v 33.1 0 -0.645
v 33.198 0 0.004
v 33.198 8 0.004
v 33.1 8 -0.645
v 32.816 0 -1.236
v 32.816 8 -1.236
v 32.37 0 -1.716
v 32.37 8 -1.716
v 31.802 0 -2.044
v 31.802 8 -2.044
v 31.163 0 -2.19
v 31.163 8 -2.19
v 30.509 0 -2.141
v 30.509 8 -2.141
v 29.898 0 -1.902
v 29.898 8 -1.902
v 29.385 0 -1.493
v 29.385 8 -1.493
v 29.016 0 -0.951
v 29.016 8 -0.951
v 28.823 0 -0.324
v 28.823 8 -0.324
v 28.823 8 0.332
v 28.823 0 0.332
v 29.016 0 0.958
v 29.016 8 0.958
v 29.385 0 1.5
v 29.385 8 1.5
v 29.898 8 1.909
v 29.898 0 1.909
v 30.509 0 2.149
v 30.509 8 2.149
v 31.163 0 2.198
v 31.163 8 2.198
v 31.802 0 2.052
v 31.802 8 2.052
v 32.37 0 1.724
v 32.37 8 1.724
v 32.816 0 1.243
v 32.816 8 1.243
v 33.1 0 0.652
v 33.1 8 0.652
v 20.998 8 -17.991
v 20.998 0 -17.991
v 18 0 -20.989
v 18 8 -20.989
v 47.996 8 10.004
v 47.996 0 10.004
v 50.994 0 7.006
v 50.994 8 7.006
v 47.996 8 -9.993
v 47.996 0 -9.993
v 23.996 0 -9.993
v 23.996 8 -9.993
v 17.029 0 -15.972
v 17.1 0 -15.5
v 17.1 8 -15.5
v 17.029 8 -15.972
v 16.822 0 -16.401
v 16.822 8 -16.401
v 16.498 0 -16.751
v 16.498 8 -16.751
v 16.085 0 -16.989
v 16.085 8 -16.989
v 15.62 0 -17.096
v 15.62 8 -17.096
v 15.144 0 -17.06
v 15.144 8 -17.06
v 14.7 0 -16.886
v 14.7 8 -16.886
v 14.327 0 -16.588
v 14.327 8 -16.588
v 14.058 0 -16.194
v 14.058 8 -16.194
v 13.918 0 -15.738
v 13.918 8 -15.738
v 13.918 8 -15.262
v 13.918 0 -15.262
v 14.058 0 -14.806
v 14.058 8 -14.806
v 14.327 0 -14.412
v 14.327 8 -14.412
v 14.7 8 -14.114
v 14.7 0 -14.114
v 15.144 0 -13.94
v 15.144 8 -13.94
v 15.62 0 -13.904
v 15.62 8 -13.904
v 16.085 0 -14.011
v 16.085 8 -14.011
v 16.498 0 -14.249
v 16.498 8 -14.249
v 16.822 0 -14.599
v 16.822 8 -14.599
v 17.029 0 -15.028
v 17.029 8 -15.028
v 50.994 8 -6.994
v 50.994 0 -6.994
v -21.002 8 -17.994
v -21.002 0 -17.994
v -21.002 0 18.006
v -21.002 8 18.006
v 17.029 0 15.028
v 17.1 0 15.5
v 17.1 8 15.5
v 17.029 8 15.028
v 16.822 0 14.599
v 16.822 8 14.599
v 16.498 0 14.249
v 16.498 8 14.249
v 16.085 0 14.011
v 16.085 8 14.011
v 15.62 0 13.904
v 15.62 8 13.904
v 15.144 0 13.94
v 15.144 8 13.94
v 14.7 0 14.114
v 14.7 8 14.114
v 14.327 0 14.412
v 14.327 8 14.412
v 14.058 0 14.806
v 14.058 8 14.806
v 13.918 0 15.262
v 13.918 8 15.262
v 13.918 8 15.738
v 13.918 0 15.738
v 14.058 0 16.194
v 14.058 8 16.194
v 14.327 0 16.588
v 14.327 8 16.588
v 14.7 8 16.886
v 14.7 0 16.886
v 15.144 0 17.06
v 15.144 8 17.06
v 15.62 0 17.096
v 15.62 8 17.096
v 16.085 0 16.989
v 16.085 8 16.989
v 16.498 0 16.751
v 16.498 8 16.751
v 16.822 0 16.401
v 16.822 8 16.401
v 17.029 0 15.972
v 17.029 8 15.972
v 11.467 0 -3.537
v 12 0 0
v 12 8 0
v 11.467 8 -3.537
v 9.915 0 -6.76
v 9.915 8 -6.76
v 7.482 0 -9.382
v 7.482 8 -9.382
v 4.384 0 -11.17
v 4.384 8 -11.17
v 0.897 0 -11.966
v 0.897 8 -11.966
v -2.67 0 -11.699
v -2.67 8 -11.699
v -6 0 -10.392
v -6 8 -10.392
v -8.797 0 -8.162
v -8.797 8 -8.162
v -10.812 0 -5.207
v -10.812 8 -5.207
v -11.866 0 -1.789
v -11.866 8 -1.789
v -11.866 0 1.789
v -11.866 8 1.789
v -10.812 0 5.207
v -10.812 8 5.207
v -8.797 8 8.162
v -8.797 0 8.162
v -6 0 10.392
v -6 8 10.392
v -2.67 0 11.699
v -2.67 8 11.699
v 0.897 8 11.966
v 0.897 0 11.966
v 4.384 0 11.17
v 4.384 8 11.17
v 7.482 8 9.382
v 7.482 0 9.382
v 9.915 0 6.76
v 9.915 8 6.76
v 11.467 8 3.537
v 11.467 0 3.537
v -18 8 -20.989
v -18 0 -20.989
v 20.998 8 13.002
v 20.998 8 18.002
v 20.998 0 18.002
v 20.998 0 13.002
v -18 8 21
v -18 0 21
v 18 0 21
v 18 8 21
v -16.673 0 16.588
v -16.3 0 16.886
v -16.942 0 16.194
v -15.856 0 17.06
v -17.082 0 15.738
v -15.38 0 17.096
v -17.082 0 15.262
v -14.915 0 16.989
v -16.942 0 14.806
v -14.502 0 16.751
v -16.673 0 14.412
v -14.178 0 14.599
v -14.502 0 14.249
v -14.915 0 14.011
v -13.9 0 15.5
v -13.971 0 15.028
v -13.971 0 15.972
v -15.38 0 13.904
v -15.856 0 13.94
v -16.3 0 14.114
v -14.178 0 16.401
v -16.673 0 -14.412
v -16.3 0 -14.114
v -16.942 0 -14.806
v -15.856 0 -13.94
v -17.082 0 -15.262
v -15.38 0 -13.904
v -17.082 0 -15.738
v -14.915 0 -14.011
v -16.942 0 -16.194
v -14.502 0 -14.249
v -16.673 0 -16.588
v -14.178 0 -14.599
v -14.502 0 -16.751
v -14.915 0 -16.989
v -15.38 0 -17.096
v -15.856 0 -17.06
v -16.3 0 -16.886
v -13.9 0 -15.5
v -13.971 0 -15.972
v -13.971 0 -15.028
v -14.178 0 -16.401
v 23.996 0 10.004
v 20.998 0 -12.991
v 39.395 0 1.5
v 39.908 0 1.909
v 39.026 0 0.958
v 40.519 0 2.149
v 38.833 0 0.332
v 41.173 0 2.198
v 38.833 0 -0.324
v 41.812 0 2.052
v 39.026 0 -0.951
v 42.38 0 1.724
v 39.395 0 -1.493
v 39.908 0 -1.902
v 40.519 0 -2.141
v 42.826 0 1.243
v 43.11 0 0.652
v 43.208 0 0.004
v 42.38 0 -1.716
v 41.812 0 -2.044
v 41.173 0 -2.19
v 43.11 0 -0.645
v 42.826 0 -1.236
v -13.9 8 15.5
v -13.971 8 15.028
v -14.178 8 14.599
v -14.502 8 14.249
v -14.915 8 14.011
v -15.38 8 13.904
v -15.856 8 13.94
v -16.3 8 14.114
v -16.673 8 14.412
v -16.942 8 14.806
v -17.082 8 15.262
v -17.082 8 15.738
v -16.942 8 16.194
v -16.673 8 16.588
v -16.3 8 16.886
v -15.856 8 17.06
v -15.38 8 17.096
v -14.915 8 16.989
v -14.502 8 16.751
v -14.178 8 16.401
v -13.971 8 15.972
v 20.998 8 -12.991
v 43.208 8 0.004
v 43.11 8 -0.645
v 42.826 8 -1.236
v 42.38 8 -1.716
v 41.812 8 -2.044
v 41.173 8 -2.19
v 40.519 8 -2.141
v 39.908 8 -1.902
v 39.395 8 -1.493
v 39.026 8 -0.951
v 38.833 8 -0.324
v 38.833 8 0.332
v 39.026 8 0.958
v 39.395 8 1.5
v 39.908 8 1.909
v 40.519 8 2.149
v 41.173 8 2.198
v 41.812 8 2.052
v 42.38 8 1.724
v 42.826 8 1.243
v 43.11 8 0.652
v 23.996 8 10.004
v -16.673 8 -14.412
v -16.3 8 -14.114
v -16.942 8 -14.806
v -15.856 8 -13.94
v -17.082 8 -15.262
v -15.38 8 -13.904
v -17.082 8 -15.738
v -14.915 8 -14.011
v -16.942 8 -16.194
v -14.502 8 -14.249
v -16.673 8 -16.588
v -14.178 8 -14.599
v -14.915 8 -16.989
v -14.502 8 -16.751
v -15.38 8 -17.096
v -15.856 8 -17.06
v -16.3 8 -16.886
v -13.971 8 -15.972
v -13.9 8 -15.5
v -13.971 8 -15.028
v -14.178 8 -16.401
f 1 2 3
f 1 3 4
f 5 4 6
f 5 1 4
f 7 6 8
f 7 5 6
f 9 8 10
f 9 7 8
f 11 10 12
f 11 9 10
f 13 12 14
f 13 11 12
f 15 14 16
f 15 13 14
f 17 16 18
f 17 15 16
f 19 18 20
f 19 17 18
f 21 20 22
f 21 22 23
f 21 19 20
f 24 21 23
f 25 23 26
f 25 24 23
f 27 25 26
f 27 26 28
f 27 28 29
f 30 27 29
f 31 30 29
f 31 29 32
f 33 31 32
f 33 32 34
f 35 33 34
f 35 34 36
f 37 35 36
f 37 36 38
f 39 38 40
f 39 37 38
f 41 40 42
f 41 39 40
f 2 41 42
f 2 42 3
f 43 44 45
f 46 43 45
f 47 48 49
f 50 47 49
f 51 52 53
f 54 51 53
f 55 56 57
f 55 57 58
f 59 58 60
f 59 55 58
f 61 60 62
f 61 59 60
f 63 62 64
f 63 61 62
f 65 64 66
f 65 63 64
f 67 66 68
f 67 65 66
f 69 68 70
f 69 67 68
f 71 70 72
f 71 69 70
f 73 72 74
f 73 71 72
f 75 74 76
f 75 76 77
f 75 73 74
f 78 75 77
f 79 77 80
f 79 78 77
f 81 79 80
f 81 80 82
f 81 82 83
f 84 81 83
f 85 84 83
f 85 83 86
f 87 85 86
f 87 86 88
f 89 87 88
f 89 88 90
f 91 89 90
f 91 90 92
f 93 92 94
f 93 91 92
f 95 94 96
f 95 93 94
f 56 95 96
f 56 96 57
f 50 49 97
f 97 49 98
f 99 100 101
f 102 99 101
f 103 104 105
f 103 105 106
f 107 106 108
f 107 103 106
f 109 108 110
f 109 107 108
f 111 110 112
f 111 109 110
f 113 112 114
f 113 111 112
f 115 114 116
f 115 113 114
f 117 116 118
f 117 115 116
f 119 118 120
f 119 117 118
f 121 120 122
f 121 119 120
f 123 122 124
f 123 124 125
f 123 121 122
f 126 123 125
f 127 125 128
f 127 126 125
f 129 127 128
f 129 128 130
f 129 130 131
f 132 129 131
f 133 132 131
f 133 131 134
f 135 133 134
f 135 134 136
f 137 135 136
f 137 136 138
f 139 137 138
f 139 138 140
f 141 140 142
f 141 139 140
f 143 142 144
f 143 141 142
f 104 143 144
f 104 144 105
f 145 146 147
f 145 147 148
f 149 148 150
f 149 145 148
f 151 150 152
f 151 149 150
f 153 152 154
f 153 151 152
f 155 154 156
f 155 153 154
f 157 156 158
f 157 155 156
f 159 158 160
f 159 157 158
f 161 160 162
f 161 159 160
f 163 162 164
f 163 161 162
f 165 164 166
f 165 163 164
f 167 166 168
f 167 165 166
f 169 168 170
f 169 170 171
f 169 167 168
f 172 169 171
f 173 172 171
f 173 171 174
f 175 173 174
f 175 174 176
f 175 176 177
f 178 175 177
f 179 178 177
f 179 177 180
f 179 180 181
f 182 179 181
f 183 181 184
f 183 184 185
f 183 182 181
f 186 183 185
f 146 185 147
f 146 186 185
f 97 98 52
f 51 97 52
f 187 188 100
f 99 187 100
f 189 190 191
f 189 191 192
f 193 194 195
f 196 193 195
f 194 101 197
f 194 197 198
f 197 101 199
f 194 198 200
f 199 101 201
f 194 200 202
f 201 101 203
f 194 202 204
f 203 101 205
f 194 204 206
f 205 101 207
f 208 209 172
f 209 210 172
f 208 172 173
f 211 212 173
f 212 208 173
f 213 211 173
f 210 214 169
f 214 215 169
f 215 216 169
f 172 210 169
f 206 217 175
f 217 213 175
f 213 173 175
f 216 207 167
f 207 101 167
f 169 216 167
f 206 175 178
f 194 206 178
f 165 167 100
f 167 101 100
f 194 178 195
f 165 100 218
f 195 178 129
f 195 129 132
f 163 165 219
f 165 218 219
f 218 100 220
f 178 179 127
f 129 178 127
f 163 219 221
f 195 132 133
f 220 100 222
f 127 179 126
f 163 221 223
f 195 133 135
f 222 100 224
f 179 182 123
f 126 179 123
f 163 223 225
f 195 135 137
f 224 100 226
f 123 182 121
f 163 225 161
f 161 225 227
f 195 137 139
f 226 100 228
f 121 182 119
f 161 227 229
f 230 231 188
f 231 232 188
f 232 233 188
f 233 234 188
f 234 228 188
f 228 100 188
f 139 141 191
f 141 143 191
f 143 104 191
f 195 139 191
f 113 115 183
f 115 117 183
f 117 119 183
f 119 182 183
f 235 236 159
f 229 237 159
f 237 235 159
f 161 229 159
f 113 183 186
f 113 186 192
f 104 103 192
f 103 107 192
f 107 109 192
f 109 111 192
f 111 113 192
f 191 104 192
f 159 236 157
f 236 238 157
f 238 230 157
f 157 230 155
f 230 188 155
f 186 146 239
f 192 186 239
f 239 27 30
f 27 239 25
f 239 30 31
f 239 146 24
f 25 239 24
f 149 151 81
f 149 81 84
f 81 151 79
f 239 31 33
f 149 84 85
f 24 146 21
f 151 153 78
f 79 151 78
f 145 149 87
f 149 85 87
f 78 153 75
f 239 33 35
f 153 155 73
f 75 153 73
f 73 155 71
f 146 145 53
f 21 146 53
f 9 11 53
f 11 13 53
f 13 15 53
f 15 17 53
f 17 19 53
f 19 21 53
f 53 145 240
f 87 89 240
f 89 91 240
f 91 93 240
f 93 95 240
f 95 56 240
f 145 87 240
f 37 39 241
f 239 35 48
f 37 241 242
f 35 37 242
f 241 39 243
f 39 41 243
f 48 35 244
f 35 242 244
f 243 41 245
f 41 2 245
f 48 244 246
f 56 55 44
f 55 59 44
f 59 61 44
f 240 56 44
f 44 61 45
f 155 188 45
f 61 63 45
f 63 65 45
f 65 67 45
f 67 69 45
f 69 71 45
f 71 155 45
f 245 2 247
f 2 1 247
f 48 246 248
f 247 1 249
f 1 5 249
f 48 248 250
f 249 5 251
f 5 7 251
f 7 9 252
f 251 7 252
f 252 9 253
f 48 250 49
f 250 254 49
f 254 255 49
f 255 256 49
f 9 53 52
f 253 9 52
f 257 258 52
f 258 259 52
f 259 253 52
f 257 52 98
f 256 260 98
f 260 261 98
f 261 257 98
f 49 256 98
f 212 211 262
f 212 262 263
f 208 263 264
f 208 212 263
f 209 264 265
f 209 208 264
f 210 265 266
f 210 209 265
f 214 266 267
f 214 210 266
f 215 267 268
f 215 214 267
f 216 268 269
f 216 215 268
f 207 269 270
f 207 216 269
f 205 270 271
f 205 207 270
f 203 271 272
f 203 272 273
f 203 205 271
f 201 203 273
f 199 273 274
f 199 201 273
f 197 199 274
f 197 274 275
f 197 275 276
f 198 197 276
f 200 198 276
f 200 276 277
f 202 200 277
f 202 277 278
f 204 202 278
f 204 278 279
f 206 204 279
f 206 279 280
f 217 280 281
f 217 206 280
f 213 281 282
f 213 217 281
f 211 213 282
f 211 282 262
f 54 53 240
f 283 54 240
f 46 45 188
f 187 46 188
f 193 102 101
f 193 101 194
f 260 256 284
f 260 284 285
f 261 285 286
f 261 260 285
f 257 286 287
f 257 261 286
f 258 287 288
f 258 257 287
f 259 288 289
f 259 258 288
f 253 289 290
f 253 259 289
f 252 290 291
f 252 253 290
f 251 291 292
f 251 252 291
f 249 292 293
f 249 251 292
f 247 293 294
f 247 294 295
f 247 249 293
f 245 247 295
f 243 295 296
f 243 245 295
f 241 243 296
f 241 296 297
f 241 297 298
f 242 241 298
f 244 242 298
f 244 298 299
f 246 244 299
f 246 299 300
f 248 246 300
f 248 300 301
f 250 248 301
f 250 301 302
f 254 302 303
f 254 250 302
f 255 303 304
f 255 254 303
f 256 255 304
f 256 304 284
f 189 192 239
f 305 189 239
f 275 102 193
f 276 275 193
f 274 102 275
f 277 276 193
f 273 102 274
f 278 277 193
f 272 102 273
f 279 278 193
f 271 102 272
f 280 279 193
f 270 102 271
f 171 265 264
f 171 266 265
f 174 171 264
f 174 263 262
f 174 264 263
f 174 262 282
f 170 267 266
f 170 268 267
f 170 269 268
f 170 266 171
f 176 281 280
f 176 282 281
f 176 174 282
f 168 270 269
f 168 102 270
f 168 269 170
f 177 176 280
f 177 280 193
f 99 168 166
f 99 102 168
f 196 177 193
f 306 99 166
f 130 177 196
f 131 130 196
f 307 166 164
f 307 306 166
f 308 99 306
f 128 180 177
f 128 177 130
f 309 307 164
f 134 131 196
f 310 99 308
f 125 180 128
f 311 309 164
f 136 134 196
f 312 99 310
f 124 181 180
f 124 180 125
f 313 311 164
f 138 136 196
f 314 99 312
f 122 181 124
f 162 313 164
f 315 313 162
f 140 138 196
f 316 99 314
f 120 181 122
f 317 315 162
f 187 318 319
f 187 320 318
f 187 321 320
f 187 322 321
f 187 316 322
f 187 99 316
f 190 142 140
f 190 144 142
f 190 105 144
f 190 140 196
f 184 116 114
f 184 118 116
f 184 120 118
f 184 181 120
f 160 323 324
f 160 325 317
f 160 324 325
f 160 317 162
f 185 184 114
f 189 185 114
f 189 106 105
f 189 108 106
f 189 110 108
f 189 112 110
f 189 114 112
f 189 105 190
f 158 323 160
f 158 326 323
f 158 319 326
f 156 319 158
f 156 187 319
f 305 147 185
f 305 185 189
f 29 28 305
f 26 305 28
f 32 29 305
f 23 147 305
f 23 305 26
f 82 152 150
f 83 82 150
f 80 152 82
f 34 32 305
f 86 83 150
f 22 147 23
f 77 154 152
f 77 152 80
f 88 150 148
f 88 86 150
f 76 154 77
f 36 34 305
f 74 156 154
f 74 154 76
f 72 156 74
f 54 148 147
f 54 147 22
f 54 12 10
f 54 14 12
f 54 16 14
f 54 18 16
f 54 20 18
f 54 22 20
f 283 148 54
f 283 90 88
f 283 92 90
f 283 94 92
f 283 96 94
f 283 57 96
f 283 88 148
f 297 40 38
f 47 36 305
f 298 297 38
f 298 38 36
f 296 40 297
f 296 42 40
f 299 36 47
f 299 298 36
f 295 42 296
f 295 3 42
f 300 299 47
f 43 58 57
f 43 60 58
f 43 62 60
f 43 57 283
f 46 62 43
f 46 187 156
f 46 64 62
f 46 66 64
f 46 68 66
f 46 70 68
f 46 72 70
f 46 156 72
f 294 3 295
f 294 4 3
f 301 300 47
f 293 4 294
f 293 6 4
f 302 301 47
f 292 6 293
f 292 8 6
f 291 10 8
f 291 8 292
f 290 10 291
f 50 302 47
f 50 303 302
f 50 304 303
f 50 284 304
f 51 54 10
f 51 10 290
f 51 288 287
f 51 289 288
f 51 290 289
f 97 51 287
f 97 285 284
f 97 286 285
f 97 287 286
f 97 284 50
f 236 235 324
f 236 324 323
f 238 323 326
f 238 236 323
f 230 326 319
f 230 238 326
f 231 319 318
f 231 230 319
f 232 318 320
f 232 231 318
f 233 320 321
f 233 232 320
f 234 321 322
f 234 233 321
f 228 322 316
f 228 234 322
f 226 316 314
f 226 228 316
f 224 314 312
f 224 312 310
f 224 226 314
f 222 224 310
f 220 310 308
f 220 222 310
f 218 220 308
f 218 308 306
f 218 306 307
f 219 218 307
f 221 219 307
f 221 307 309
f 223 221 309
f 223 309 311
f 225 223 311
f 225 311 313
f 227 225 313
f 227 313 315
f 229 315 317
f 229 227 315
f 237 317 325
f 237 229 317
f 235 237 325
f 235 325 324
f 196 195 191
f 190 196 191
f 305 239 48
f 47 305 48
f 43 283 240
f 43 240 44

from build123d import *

# Parameters (mm, degrees)
CROQUIS1_R              = 12
CROQUIS1_R_2            = 1.6
CROQUIS1_R_3            = 2.2
SALIENTE_EXTRUIR1_DEPTH = 8


with BuildPart() as part:
    # Croquis1 → Saliente-Extruir1 (new body)
    with BuildSketch(Plane(origin=(0, 0, 0), x_dir=(1, 0, 0), z_dir=(0, 1, 0))):
        Polygon((18, -21), (20.998132752, -18.001867248), (20.998132752, -13.001867248), (23.996265504, -10.003734496), (47.996265504, -10.003734496), (50.994398257, -7.005601743), (50.994398257, 6.994398257), (47.996265504, 9.992531009), (23.996265504, 9.992531009), (20.998132752, 12.990663761), (20.998132752, 17.990663761), (18, 20.988796513), (-18, 20.988796513), (-21.001869571, 17.99439127), (-21.001869571, -18.00560873), (-18, -21), align=None)
        Circle(CROQUIS1_R, mode=Mode.SUBTRACT)
        with Locations((-15.5, -15.5)):
            Circle(CROQUIS1_R_2, mode=Mode.SUBTRACT)
        with Locations((-15.5, 15.5)):
            Circle(CROQUIS1_R_2, mode=Mode.SUBTRACT)
        with Locations((15.5, 15.5)):
            Circle(CROQUIS1_R_2, mode=Mode.SUBTRACT)
        with Locations((15.5, -15.5)):
            Circle(CROQUIS1_R_2, mode=Mode.SUBTRACT)
        with Locations((30.998135075, -0.003734496)):
            Circle(CROQUIS1_R_3, mode=Mode.SUBTRACT)
        with Locations((41.008135075, -0.003734496)):
            Circle(CROQUIS1_R_3, mode=Mode.SUBTRACT)
    extrude(amount=SALIENTE_EXTRUIR1_DEPTH)


solid = part.part
